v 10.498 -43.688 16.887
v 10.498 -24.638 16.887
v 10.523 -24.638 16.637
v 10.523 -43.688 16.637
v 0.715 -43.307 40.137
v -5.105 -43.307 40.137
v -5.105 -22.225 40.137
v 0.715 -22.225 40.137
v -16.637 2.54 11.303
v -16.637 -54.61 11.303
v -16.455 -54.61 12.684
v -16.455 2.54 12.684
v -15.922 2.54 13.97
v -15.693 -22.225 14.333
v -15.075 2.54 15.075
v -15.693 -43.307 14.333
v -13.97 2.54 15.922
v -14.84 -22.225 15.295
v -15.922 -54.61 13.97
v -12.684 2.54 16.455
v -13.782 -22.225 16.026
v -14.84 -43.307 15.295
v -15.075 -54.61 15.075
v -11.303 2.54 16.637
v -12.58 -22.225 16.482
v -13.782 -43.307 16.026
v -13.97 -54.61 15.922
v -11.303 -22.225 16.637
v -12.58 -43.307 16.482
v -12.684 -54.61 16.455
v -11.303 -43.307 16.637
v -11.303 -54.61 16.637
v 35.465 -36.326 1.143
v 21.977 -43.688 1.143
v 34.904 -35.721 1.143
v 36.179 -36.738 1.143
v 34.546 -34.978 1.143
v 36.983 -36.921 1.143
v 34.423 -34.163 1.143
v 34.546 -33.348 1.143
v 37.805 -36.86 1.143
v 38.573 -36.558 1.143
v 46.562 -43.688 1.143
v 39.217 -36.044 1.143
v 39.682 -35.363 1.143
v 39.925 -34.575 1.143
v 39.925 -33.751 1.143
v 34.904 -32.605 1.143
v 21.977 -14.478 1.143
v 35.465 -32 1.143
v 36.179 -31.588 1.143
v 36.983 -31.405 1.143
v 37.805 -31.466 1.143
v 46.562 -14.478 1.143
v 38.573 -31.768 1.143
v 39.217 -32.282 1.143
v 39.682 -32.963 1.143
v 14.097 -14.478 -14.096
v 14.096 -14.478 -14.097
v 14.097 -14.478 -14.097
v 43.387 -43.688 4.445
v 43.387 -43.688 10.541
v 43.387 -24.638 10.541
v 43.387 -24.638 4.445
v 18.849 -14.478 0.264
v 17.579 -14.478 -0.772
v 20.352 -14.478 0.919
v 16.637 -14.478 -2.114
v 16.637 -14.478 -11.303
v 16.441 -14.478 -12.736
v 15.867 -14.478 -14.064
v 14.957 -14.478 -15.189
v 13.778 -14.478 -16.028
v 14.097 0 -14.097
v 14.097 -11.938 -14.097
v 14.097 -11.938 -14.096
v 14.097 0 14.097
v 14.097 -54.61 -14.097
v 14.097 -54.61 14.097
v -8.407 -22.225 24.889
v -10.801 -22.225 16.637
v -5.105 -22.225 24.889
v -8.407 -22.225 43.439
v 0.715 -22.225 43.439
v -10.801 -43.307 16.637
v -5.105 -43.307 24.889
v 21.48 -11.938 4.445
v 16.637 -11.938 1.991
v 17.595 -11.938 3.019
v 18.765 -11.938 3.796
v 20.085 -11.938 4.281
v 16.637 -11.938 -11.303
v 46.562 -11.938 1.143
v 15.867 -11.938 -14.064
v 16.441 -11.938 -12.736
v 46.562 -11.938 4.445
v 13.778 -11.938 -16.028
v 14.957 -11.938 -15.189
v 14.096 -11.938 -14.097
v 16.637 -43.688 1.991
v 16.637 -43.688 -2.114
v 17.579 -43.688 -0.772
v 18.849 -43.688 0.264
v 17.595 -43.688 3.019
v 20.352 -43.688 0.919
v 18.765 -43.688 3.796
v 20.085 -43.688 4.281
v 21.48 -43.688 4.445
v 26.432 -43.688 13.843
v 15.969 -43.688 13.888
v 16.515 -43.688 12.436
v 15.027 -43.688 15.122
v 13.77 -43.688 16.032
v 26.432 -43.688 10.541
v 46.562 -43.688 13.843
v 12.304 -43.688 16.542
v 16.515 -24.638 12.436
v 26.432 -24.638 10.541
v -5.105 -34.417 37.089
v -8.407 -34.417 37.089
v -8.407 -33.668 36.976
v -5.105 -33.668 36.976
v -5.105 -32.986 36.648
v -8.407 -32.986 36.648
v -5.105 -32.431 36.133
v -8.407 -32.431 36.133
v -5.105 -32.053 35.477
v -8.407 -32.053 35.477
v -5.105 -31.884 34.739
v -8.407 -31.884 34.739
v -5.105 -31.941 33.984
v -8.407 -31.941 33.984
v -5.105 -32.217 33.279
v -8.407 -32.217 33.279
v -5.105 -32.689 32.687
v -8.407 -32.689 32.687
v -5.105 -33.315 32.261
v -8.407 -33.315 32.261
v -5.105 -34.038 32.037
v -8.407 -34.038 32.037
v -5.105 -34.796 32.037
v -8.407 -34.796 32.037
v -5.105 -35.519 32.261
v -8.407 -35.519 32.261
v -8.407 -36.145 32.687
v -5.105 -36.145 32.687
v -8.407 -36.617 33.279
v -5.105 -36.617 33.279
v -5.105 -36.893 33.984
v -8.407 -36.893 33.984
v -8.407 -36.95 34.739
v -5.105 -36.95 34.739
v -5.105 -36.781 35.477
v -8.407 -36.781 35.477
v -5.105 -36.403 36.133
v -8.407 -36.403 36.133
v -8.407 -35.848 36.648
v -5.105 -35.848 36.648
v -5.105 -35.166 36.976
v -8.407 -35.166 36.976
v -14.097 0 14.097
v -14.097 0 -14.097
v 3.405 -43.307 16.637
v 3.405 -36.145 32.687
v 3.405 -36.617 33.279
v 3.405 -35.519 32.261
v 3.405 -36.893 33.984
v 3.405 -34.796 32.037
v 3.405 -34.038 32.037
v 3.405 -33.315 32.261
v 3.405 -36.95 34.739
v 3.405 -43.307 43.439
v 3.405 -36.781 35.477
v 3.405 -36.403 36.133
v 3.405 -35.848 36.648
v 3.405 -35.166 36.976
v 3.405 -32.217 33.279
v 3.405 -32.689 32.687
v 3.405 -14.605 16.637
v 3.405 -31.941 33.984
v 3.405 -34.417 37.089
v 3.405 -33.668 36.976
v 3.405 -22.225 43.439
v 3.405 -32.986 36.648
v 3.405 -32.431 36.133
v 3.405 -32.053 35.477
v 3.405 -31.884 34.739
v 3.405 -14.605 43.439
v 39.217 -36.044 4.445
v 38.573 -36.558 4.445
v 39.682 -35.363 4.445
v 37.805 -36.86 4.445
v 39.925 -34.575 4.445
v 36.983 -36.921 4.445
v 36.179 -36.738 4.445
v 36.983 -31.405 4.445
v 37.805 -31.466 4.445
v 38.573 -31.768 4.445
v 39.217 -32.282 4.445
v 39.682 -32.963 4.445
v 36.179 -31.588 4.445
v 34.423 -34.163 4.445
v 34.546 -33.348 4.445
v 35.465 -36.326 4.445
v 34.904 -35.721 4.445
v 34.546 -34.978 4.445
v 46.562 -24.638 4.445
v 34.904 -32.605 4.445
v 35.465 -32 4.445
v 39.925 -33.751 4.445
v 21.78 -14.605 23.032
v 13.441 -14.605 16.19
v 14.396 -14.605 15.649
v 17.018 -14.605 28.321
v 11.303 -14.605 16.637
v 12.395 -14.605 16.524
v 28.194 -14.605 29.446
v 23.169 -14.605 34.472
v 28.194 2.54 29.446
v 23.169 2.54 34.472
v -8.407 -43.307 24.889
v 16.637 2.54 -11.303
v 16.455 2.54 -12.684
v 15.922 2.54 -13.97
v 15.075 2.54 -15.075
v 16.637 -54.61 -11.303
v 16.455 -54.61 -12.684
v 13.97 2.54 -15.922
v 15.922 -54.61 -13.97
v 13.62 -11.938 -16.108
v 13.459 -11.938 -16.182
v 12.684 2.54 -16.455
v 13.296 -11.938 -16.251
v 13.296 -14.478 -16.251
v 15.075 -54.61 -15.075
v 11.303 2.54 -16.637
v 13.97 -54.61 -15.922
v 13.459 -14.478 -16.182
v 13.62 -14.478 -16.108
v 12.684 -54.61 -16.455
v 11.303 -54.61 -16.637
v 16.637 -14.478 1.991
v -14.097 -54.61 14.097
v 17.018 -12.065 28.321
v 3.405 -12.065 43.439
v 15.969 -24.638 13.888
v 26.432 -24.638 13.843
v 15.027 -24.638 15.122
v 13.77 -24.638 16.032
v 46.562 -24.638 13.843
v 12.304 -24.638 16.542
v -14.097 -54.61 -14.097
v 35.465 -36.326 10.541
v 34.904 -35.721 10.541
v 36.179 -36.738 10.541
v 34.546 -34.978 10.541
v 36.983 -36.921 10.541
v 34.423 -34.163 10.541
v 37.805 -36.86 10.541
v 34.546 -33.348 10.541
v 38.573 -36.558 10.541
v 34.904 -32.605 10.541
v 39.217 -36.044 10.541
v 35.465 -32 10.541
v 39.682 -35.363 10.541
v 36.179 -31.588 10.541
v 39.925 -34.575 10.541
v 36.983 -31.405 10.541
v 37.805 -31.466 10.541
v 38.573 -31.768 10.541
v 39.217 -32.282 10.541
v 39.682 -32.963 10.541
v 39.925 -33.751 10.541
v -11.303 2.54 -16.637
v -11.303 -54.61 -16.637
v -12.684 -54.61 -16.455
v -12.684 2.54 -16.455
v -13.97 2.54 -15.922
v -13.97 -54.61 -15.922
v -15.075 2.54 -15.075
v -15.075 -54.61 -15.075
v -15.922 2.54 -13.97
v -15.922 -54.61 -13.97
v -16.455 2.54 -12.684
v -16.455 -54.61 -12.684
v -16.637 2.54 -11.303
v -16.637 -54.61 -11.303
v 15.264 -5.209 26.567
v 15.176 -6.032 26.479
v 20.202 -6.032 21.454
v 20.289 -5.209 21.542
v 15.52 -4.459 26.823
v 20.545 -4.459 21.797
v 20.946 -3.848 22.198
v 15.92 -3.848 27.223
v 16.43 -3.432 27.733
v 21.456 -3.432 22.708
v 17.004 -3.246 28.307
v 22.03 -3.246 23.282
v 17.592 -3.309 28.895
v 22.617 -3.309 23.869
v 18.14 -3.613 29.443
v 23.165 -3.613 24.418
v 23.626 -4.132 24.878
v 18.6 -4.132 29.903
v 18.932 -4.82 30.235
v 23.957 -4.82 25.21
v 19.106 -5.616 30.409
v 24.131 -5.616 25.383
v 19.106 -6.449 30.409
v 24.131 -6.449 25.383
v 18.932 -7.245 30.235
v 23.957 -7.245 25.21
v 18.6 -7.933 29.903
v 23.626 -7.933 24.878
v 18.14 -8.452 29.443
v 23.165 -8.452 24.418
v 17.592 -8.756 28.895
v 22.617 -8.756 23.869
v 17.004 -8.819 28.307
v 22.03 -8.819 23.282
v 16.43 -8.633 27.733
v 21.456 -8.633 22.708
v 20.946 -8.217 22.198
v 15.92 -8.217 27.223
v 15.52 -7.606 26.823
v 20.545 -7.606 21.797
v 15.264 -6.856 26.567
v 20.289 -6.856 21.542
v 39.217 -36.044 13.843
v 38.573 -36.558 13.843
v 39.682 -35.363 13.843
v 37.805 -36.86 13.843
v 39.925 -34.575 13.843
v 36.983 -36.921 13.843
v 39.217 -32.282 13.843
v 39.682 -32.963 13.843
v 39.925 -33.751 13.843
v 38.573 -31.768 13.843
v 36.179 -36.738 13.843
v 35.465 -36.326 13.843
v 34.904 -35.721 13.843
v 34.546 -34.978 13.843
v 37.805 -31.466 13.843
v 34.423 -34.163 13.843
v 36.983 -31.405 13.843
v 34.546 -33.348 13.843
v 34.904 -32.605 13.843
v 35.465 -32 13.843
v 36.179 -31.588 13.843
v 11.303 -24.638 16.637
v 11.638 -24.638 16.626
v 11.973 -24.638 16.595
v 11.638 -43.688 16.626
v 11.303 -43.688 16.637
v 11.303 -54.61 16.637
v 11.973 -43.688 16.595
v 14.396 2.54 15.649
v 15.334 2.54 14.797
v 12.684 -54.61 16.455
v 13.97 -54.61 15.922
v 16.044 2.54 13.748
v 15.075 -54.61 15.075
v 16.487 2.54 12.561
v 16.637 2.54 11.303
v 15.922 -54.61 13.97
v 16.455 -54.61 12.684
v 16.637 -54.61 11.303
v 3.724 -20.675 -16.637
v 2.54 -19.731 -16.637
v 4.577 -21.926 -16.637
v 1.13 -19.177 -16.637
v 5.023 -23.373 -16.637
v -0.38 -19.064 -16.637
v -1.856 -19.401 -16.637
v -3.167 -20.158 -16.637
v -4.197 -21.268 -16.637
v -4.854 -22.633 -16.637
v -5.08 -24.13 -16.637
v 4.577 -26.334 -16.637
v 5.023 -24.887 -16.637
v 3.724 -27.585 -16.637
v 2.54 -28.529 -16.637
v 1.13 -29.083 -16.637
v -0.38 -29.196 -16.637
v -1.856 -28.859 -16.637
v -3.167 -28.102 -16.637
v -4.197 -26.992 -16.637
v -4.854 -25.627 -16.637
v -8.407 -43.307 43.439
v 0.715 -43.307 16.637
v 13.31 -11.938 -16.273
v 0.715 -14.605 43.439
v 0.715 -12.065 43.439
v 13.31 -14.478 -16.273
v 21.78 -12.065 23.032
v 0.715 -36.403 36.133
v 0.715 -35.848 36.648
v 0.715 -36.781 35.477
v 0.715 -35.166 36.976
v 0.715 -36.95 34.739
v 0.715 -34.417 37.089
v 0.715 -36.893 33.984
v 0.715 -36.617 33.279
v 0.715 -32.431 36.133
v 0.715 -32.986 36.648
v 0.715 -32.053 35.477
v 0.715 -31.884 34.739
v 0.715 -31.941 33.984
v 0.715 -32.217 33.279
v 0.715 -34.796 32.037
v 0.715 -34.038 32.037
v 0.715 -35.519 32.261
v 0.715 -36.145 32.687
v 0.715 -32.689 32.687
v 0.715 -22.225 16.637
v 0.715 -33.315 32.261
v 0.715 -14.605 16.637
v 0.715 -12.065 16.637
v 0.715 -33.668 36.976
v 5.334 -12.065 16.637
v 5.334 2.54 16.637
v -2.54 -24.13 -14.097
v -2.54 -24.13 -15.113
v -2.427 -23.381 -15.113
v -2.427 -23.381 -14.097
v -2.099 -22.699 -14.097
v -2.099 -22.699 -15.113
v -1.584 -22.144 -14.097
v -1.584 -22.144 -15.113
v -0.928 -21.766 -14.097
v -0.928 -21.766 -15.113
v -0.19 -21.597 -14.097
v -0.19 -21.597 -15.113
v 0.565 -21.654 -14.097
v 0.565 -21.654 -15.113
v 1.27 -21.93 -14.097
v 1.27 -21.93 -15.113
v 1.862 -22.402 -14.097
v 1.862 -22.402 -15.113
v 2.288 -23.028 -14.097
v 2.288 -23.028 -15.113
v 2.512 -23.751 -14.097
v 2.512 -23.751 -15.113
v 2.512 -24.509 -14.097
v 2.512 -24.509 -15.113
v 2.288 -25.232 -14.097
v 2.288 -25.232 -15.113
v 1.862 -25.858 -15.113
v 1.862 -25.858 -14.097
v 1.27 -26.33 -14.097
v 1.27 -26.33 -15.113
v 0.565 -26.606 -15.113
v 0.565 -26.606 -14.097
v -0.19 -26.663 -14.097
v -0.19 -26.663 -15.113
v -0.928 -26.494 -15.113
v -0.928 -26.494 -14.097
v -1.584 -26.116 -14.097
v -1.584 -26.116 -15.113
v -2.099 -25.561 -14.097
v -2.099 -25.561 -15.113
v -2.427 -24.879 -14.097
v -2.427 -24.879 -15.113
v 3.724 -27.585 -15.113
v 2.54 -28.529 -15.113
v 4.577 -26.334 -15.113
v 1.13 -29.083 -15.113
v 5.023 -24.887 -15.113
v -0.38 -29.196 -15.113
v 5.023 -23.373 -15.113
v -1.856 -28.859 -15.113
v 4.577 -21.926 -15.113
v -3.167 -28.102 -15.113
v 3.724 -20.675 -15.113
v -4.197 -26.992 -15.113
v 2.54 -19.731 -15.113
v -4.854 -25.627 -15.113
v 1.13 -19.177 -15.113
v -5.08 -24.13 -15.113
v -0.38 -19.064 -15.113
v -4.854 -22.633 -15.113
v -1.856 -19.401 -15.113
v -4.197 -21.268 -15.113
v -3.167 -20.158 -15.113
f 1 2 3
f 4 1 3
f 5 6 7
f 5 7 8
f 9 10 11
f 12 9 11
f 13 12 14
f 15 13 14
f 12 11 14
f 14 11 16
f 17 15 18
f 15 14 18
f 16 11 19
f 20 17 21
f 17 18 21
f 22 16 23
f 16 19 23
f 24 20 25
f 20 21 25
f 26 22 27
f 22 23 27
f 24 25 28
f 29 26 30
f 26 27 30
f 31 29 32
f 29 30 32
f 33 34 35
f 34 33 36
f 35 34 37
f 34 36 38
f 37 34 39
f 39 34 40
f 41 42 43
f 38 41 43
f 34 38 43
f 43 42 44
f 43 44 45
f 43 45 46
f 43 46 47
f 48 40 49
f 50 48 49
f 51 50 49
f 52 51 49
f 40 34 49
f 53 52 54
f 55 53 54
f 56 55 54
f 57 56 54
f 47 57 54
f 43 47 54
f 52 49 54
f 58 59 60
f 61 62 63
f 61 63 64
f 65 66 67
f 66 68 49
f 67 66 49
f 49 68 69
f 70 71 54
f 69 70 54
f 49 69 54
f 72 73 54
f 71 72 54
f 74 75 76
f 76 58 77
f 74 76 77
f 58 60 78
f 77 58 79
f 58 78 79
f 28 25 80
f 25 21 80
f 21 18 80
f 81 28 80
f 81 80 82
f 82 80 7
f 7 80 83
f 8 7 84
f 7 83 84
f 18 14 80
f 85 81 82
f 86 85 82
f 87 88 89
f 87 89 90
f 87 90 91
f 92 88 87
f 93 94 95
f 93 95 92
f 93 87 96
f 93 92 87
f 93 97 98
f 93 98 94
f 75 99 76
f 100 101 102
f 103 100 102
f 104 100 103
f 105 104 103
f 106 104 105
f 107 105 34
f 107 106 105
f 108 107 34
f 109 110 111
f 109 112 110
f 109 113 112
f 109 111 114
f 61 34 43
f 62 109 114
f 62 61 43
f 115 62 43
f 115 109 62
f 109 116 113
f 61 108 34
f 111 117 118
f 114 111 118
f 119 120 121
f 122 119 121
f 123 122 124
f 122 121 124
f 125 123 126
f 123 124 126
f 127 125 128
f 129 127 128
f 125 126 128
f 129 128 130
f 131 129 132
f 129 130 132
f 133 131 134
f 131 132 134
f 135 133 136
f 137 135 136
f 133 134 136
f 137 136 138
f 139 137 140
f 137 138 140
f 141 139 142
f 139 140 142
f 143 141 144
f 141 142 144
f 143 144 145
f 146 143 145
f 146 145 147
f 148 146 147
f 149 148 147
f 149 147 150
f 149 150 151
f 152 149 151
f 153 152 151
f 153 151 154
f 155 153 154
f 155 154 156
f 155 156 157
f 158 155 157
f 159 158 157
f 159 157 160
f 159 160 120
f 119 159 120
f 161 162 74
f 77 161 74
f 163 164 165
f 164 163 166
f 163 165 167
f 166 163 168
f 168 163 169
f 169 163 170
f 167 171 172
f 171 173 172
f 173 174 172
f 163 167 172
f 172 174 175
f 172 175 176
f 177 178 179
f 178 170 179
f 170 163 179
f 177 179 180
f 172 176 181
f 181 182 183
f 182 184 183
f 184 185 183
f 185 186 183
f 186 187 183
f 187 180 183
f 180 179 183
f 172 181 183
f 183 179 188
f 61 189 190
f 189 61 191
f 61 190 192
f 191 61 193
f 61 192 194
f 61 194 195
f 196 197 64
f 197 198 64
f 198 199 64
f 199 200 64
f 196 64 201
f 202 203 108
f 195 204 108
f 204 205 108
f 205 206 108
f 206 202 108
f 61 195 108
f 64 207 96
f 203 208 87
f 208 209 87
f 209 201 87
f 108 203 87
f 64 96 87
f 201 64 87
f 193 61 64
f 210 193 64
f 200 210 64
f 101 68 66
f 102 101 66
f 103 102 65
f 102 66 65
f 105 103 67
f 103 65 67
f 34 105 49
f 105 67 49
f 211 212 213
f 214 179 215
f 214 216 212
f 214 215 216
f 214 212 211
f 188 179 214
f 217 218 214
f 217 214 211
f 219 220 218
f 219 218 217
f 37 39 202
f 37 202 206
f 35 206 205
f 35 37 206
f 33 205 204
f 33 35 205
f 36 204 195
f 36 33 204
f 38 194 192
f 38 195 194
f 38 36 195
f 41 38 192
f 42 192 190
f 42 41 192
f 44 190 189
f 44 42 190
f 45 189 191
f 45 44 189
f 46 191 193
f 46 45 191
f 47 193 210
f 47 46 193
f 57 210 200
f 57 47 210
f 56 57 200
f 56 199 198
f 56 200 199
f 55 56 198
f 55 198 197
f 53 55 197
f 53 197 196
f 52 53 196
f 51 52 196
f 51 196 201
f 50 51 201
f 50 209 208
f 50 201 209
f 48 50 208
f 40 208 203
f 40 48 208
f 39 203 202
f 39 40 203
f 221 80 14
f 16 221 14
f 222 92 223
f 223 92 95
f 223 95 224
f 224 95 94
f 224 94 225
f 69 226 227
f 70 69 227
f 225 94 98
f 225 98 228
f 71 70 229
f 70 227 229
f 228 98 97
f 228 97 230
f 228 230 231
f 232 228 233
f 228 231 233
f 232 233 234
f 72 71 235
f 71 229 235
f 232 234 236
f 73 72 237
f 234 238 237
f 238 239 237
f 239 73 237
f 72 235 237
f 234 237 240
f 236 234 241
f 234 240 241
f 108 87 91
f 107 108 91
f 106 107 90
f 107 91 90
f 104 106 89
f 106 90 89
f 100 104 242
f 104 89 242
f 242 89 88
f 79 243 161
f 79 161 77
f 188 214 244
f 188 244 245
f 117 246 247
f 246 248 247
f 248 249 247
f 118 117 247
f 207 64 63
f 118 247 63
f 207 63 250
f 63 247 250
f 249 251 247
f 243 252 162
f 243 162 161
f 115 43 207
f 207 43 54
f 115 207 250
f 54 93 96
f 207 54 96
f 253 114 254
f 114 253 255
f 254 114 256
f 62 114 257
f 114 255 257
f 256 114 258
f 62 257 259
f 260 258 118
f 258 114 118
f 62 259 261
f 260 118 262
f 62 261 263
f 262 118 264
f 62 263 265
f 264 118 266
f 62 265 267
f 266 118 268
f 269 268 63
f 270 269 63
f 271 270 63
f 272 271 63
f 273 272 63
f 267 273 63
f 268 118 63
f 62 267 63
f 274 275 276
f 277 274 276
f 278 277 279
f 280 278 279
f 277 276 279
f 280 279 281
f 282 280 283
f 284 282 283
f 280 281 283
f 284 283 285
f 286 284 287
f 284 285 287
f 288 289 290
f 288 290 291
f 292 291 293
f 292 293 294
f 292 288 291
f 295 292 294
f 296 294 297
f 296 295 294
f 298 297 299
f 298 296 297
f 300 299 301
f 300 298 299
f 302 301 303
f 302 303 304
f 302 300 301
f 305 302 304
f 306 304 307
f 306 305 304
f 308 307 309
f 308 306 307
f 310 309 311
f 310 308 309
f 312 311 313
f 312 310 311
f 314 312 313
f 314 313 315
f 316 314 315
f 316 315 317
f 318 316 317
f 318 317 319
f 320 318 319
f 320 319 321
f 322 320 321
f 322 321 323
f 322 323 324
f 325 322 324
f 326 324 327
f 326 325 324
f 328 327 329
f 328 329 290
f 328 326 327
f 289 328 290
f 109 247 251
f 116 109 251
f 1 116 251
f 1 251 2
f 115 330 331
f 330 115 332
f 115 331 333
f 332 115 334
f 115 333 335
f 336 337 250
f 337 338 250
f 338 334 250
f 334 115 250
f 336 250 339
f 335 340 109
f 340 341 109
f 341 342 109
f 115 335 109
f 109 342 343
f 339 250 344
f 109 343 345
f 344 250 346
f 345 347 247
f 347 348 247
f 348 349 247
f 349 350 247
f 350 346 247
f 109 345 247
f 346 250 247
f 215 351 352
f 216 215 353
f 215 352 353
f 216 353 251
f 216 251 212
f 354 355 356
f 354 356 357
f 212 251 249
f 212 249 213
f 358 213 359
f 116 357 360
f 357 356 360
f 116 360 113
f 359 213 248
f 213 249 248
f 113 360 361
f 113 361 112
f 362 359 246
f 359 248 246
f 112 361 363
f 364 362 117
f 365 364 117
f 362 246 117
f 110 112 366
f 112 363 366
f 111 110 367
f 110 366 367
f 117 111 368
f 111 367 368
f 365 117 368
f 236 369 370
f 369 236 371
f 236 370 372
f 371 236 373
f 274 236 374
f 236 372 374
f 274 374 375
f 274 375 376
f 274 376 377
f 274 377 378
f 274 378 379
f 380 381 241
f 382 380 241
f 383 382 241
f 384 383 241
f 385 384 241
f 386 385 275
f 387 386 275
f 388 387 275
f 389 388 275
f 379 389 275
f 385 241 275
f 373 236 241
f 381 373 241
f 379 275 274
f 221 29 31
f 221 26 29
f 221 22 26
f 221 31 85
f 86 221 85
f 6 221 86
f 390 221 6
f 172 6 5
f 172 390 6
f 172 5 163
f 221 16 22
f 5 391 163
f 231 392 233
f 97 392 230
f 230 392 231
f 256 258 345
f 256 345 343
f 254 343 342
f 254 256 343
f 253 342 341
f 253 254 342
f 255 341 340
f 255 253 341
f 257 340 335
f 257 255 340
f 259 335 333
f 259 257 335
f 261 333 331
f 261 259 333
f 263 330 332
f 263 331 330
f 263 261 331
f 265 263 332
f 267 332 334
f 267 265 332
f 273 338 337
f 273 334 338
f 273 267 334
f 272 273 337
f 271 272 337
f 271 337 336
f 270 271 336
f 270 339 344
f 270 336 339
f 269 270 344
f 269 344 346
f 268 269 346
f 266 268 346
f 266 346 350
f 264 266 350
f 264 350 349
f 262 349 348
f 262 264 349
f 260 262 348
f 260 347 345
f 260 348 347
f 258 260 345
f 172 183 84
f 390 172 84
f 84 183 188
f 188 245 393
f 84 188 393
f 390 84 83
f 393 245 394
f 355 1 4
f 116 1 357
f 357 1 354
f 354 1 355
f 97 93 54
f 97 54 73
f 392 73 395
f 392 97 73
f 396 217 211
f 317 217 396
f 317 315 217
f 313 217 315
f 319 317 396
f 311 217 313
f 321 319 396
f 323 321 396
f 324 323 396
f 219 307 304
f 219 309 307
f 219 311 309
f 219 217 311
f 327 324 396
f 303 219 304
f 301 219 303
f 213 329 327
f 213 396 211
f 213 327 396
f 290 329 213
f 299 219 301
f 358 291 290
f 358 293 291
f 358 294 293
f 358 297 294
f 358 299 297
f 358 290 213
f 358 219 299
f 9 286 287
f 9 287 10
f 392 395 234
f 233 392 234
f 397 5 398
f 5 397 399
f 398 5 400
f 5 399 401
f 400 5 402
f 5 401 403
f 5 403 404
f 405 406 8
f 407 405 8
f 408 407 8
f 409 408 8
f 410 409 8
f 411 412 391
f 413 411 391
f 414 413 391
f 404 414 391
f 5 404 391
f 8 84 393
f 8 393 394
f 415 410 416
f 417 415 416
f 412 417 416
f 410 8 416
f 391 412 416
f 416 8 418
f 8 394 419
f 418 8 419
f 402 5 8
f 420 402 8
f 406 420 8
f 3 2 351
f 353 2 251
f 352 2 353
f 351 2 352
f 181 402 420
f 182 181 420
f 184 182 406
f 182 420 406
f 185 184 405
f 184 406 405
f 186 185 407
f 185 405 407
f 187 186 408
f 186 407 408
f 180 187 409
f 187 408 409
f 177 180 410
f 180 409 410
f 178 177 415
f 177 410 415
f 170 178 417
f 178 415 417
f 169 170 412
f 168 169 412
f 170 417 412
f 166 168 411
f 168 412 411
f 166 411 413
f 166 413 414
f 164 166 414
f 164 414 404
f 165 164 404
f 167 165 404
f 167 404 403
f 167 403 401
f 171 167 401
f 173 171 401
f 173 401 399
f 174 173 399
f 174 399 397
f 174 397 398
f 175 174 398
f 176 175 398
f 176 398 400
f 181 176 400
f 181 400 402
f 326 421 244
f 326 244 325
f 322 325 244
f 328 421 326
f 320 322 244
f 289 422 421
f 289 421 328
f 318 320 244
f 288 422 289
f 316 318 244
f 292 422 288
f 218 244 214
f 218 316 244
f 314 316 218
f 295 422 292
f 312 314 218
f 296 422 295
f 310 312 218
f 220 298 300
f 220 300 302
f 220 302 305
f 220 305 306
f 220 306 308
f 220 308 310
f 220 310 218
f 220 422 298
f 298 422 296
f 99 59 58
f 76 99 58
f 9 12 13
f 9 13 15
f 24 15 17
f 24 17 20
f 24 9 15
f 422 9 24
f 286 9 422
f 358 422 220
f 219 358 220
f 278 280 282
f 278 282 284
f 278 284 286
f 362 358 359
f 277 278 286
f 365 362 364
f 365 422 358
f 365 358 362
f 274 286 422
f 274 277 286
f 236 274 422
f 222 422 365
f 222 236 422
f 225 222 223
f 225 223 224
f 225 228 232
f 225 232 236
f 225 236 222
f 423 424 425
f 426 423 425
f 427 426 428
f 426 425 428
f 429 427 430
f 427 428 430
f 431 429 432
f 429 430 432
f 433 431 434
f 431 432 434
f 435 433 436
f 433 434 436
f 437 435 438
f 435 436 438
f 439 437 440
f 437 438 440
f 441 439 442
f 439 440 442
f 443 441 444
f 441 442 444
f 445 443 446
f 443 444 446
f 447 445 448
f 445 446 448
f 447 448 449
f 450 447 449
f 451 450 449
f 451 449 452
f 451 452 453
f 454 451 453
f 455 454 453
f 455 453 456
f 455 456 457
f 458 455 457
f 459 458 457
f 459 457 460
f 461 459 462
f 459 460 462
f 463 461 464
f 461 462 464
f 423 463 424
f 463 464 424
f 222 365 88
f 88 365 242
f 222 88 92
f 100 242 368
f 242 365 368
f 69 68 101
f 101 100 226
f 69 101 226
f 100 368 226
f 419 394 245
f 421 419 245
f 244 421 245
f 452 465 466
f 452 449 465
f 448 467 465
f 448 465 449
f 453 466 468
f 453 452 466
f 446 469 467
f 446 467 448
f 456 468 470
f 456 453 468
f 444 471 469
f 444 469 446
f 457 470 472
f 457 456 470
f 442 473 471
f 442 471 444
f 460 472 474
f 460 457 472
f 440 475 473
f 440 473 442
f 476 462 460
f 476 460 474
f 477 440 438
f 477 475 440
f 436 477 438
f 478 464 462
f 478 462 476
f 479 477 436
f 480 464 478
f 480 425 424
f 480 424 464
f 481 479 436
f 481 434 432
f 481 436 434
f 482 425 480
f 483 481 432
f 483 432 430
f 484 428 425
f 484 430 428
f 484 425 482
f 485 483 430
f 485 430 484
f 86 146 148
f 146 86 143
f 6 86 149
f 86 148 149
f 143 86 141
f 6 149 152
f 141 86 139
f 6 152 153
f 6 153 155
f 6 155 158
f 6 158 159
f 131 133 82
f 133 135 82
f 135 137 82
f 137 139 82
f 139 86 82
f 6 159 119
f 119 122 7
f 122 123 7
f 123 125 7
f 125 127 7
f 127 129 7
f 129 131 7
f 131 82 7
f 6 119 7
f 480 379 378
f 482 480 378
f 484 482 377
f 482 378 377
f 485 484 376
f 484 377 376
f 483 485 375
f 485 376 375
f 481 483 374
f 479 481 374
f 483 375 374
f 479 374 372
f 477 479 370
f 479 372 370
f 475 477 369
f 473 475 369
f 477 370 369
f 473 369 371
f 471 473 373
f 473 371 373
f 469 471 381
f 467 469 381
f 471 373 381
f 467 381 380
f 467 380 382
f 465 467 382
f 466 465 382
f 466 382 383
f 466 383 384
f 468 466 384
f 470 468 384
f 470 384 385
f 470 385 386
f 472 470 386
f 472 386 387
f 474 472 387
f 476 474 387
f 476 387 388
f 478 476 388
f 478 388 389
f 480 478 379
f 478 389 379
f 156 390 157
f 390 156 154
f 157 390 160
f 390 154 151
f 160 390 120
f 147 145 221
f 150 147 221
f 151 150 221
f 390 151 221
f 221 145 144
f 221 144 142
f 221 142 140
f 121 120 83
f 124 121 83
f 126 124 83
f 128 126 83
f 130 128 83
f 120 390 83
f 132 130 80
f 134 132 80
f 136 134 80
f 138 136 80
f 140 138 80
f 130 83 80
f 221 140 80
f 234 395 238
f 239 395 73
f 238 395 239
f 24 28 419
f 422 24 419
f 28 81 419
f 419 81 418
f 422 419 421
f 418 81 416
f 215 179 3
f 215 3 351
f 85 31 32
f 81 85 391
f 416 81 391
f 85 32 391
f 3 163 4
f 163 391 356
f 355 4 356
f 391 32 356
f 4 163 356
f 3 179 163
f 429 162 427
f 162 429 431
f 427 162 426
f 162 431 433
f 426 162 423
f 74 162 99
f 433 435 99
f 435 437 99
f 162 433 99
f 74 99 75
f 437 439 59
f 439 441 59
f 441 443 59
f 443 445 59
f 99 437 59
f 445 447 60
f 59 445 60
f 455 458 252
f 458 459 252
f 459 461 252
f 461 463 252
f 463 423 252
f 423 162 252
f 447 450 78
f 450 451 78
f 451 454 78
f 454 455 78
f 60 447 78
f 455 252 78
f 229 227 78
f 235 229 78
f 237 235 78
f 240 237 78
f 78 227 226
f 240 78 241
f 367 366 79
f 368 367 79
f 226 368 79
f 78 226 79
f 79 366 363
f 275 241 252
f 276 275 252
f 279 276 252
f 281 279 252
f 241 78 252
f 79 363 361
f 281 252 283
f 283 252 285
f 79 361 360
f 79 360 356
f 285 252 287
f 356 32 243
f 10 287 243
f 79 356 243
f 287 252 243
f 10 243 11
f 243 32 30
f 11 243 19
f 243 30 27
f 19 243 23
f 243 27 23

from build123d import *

# Parameters (mm, degrees)
BOSS_EXTRUDE1_DEPTH     = 2.54
BOSS_EXTRUDE2_START     = 54.61
SKETCH2_W               = 28.194
SKETCH2_H               = 28.194
BOSS_EXTRUDE2_DEPTH     = 54.61
SKETCH4_R               = 5.08
CUT_EXTRUDE2_DEPTH      = 1.524
SKETCH5_R               = 2.54
CUT_EXTRUDE3_DEPTH      = 1.016
BOSS_EXTRUDE3_DEPTH     = 17.145
CUT_EXTRUDE4_START      = -7.10691
SKETCH7_R               = 2.794
CUT_EXTRUDE4_DEPTH      = 7.10691
BOSS_EXTRUDE4_DEPTH     = 2.54
BOSS_EXTRUDE5_DEPTH     = 10.16
BOSS_EXTRUDE6_DEPTH     = 19.05
CUT_EXTRUDE5_DEPTH      = 13.716
CUT_EXTRUDE5_DEPTH_BACK = 20.32
SKETCH13_R              = 2.76606
BOSS_EXTRUDE12_DEPTH    = 2.54
SKETCH15_W              = 2.689899245
SKETCH15_H              = 26.801981191
BOSS_EXTRUDE13_DEPTH    = 7.62
BOSS_EXTRUDE14_DEPTH    = 21.082
SKETCH17_R              = 2.54
CUT_EXTRUDE7_DEPTH      = 21.082
CUT_EXTRUDE8_DEPTH      = 21.082


with BuildPart() as part:
    # Sketch1 → Boss-Extrude1 (new body)
    with BuildSketch(Plane(origin=(0, 0, 0), x_dir=(1, 0, 0), z_dir=(0, 1, 0))):
        with BuildLine():
            Line((-11.303, -16.637), (11.303, -16.637))
            ThreePointArc((11.303, -16.637), (15.074707571, -15.074707571), (16.637, -11.303))
            Line((16.637, -11.303), (16.637, 11.303))
            ThreePointArc((16.637, 11.303), (15.074707571, 15.074707571), (11.303, 16.637))
            Line((11.303, 16.637), (-11.303, 16.637))
            ThreePointArc((-11.303, 16.637), (-15.074707571, 15.074707571), (-16.637, 11.303))
            Line((-16.637, 11.303), (-16.637, -11.303))
            ThreePointArc((-16.637, -11.303), (-15.074707571, -15.074707571), (-11.303, -16.637))
        make_face()
    extrude(amount=BOSS_EXTRUDE1_DEPTH)

    # Sketch2 → Boss-Extrude2 (add)
    with BuildSketch(Plane.XZ.offset(BOSS_EXTRUDE2_START)):
        with BuildLine():
            Line((-11.303, 16.637), (11.303, 16.637))
            ThreePointArc((11.303, 16.637), (15.074707571, 15.074707571), (16.637, 11.303))
            Line((16.637, 11.303), (16.637, -11.303))
            ThreePointArc((16.637, -11.303), (15.074707571, -15.074707571), (11.303, -16.637))
            Line((11.303, -16.637), (-11.303, -16.637))
            ThreePointArc((-11.303, -16.637), (-15.074707571, -15.074707571), (-16.637, -11.303))
            Line((-16.637, -11.303), (-16.637, 11.303))
            ThreePointArc((-16.637, 11.303), (-15.074707571, 15.074707571), (-11.303, 16.637))
        make_face()
        Rectangle(SKETCH2_W, SKETCH2_H, mode=Mode.SUBTRACT)
    extrude(amount=-BOSS_EXTRUDE2_DEPTH)

    # Sketch4 → Cut-Extrude2 (cut)
    with BuildSketch(Plane(origin=(0, 0, -16.637), x_dir=(-1, 0, 0), z_dir=(0, 0, -1))):
        with Locations((0, -24.13)):
            Circle(SKETCH4_R)
    extrude(amount=-CUT_EXTRUDE2_DEPTH, mode=Mode.SUBTRACT)

    # Sketch5 → Cut-Extrude3 (cut)
    with BuildSketch(Plane(origin=(0, 0, -15.113), x_dir=(-1, 0, 0), z_dir=(0, 0, -1))):
        with Locations((0, -24.13)):
            Circle(SKETCH5_R)
    extrude(amount=-CUT_EXTRUDE3_DEPTH, mode=Mode.SUBTRACT)

    # Sketch6 → Boss-Extrude3 (add)
    with BuildSketch(Plane(origin=(0, 2.54, 0), x_dir=(1, 0, 0), z_dir=(0, 1, 0))):
        Polygon((5.334, -16.637), (23.168788656, -34.471788656), (28.194132537, -29.446444776), (14.396212982, -15.648525221), align=None)
    extrude(amount=-BOSS_EXTRUDE3_DEPTH)

    # Sketch7 → Cut-Extrude4 (cut)
    with BuildSketch(Plane(origin=(-0.62615612, 0, 0.62615612), x_dir=(-0.7071067811865477, 0, -0.7071067811865475), z_dir=(0.7071067811865475, 0, -0.7071067811865477)).offset(CUT_EXTRUDE4_START)):
        with Locations((-32.249043089, -6.0325)):
            Circle(SKETCH7_R)
    extrude(amount=CUT_EXTRUDE4_DEPTH, mode=Mode.SUBTRACT)

    # Sketch9 → Boss-Extrude4 (add)
    with BuildSketch(Plane(origin=(0, -11.938, 0), x_dir=(1, 0, 0), z_dir=(0, 1, 0))):
        with BuildLine():
            Line((46.562129264, -1.143), (13.310139602, 16.273079187))
            Line((13.310139602, 16.273079187), (12.964036607, 15.721651043))
            Line((12.964036607, 15.721651043), (15.475295461, 12.118791083))
            Line((15.475295461, 12.118791083), (15.475295461, 3.129239018))
            Line((15.475295461, 3.129239018), (15.475295461, 1.47632638))
            ThreePointArc((15.475295461, 1.47632638), (17.263507322, -2.715683033), (21.480153786, -4.445))
            Line((21.480153786, -4.445), (38.24328617, -4.445))
            Line((38.24328617, -4.445), (46.562129264, -4.445))
            Line((46.562129264, -4.445), (46.562129264, -1.143))
        make_face()
    extrude(amount=-BOSS_EXTRUDE4_DEPTH)

    # Sketch10 → Boss-Extrude5 (add)
    with BuildSketch(Plane.XZ.offset(14.478)):
        with BuildLine():
            Line((46.562129264, 1.143), (46.562129264, 4.445))
            Line((46.562129264, 4.445), (21.480153786, 4.445))
            ThreePointArc((21.480153786, 4.445), (18.765347806, 3.796345215), (16.637, 1.990504648))
            Line((16.637, 1.990504648), (16.637, -2.114151714))
            ThreePointArc((16.637, -2.114151714), (18.849336789, 0.264449502), (21.976688198, 1.143))
            Line((21.976688198, 1.143), (46.562129264, 1.143))
        make_face()
    extrude(amount=BOSS_EXTRUDE5_DEPTH)

    # Sketch11 → Boss-Extrude6 (add)
    with BuildSketch(Plane.XZ.offset(24.638)):
        with BuildLine():
            Line((21.976688198, 1.143), (46.562129264, 1.143))
            Line((46.562129264, 1.143), (46.562129264, 4.445))
            Line((46.562129264, 4.445), (46.562129264, 13.843))
            Line((46.562129264, 13.843), (26.43228617, 13.843))
            Line((26.43228617, 13.843), (10.498277863, 16.887218473))
            Line((10.498277863, 16.887218473), (10.837249294, 13.520457424))
            Line((10.837249294, 13.520457424), (26.43228617, 10.541))
            Line((26.43228617, 10.541), (43.387129264, 10.541))
            Line((43.387129264, 10.541), (43.387129264, 4.445))
            Line((43.387129264, 4.445), (21.480153786, 4.445))
            ThreePointArc((21.480153786, 4.445), (18.765347806, 3.796345215), (16.637, 1.990504648))
            Line((16.637, 1.990504648), (16.637, -2.114151714))
            ThreePointArc((16.637, -2.114151714), (18.849336789, 0.264449502), (21.976688198, 1.143))
        make_face()
    extrude(amount=BOSS_EXTRUDE6_DEPTH)

    # Sketch13 → Cut-Extrude5 (cut, two sides: drawn at the far end of the back side and taken through both)
    with BuildSketch(Plane.XY.offset(13.843).offset(-CUT_EXTRUDE5_DEPTH_BACK)):
        with Locations(Location((37.189529264, -34.163, 0), (0, 0, 180))):
            Circle(SKETCH13_R)
    extrude(amount=CUT_EXTRUDE5_DEPTH + CUT_EXTRUDE5_DEPTH_BACK, mode=Mode.SUBTRACT)

    # Sketch14 → Boss-Extrude12 (add)
    with BuildSketch(Plane.XZ.offset(14.605)):
        Polygon((3.404930005, 43.438981191), (0.71503076, 43.438981191), (0.71503076, 16.637), (5.334, 16.637), (11.303, 16.637), (21.779567071, 23.03187931), align=None)
    extrude(amount=-BOSS_EXTRUDE12_DEPTH)

    # Sketch15 → Boss-Extrude13 (add)
    with BuildSketch(Plane.XZ.offset(14.605)):
        with Locations((2.059980383, 30.037990596)):
            Rectangle(SKETCH15_W, SKETCH15_H)
    extrude(amount=BOSS_EXTRUDE13_DEPTH)

    # Sketch16 → Boss-Extrude14 (add)
    with BuildSketch(Plane.XZ.offset(22.225)):
        Polygon((3.404930005, 16.637), (3.404930005, 43.438981191), (-8.406765612, 43.438981191), (-8.406765612, 24.889361191), (-15.692885389, 14.332927767), (-12.390885389, 14.332927767), (-5.104765612, 24.889361191), (-5.104765612, 40.136981191), (0.71503076, 40.136981191), (0.71503076, 16.637), align=None)
    extrude(amount=BOSS_EXTRUDE14_DEPTH)

    # Sketch17 → Cut-Extrude7 (cut)
    with BuildSketch(Plane.ZY.offset(8.406765612)):
        with Locations((34.548981191, -34.417)):
            Circle(SKETCH17_R)
    extrude(amount=-CUT_EXTRUDE7_DEPTH, mode=Mode.SUBTRACT)

    # Sketch18 → Cut-Extrude8 (cut)
    with BuildSketch(Plane.XZ.offset(43.688)):
        Polygon((14.097, 12.897676695), (10.837249294, 13.520457424), (10.779201972, 14.097), (14.097, 14.097), align=None)
    extrude(amount=-CUT_EXTRUDE8_DEPTH, mode=Mode.SUBTRACT)


solid = part.part
